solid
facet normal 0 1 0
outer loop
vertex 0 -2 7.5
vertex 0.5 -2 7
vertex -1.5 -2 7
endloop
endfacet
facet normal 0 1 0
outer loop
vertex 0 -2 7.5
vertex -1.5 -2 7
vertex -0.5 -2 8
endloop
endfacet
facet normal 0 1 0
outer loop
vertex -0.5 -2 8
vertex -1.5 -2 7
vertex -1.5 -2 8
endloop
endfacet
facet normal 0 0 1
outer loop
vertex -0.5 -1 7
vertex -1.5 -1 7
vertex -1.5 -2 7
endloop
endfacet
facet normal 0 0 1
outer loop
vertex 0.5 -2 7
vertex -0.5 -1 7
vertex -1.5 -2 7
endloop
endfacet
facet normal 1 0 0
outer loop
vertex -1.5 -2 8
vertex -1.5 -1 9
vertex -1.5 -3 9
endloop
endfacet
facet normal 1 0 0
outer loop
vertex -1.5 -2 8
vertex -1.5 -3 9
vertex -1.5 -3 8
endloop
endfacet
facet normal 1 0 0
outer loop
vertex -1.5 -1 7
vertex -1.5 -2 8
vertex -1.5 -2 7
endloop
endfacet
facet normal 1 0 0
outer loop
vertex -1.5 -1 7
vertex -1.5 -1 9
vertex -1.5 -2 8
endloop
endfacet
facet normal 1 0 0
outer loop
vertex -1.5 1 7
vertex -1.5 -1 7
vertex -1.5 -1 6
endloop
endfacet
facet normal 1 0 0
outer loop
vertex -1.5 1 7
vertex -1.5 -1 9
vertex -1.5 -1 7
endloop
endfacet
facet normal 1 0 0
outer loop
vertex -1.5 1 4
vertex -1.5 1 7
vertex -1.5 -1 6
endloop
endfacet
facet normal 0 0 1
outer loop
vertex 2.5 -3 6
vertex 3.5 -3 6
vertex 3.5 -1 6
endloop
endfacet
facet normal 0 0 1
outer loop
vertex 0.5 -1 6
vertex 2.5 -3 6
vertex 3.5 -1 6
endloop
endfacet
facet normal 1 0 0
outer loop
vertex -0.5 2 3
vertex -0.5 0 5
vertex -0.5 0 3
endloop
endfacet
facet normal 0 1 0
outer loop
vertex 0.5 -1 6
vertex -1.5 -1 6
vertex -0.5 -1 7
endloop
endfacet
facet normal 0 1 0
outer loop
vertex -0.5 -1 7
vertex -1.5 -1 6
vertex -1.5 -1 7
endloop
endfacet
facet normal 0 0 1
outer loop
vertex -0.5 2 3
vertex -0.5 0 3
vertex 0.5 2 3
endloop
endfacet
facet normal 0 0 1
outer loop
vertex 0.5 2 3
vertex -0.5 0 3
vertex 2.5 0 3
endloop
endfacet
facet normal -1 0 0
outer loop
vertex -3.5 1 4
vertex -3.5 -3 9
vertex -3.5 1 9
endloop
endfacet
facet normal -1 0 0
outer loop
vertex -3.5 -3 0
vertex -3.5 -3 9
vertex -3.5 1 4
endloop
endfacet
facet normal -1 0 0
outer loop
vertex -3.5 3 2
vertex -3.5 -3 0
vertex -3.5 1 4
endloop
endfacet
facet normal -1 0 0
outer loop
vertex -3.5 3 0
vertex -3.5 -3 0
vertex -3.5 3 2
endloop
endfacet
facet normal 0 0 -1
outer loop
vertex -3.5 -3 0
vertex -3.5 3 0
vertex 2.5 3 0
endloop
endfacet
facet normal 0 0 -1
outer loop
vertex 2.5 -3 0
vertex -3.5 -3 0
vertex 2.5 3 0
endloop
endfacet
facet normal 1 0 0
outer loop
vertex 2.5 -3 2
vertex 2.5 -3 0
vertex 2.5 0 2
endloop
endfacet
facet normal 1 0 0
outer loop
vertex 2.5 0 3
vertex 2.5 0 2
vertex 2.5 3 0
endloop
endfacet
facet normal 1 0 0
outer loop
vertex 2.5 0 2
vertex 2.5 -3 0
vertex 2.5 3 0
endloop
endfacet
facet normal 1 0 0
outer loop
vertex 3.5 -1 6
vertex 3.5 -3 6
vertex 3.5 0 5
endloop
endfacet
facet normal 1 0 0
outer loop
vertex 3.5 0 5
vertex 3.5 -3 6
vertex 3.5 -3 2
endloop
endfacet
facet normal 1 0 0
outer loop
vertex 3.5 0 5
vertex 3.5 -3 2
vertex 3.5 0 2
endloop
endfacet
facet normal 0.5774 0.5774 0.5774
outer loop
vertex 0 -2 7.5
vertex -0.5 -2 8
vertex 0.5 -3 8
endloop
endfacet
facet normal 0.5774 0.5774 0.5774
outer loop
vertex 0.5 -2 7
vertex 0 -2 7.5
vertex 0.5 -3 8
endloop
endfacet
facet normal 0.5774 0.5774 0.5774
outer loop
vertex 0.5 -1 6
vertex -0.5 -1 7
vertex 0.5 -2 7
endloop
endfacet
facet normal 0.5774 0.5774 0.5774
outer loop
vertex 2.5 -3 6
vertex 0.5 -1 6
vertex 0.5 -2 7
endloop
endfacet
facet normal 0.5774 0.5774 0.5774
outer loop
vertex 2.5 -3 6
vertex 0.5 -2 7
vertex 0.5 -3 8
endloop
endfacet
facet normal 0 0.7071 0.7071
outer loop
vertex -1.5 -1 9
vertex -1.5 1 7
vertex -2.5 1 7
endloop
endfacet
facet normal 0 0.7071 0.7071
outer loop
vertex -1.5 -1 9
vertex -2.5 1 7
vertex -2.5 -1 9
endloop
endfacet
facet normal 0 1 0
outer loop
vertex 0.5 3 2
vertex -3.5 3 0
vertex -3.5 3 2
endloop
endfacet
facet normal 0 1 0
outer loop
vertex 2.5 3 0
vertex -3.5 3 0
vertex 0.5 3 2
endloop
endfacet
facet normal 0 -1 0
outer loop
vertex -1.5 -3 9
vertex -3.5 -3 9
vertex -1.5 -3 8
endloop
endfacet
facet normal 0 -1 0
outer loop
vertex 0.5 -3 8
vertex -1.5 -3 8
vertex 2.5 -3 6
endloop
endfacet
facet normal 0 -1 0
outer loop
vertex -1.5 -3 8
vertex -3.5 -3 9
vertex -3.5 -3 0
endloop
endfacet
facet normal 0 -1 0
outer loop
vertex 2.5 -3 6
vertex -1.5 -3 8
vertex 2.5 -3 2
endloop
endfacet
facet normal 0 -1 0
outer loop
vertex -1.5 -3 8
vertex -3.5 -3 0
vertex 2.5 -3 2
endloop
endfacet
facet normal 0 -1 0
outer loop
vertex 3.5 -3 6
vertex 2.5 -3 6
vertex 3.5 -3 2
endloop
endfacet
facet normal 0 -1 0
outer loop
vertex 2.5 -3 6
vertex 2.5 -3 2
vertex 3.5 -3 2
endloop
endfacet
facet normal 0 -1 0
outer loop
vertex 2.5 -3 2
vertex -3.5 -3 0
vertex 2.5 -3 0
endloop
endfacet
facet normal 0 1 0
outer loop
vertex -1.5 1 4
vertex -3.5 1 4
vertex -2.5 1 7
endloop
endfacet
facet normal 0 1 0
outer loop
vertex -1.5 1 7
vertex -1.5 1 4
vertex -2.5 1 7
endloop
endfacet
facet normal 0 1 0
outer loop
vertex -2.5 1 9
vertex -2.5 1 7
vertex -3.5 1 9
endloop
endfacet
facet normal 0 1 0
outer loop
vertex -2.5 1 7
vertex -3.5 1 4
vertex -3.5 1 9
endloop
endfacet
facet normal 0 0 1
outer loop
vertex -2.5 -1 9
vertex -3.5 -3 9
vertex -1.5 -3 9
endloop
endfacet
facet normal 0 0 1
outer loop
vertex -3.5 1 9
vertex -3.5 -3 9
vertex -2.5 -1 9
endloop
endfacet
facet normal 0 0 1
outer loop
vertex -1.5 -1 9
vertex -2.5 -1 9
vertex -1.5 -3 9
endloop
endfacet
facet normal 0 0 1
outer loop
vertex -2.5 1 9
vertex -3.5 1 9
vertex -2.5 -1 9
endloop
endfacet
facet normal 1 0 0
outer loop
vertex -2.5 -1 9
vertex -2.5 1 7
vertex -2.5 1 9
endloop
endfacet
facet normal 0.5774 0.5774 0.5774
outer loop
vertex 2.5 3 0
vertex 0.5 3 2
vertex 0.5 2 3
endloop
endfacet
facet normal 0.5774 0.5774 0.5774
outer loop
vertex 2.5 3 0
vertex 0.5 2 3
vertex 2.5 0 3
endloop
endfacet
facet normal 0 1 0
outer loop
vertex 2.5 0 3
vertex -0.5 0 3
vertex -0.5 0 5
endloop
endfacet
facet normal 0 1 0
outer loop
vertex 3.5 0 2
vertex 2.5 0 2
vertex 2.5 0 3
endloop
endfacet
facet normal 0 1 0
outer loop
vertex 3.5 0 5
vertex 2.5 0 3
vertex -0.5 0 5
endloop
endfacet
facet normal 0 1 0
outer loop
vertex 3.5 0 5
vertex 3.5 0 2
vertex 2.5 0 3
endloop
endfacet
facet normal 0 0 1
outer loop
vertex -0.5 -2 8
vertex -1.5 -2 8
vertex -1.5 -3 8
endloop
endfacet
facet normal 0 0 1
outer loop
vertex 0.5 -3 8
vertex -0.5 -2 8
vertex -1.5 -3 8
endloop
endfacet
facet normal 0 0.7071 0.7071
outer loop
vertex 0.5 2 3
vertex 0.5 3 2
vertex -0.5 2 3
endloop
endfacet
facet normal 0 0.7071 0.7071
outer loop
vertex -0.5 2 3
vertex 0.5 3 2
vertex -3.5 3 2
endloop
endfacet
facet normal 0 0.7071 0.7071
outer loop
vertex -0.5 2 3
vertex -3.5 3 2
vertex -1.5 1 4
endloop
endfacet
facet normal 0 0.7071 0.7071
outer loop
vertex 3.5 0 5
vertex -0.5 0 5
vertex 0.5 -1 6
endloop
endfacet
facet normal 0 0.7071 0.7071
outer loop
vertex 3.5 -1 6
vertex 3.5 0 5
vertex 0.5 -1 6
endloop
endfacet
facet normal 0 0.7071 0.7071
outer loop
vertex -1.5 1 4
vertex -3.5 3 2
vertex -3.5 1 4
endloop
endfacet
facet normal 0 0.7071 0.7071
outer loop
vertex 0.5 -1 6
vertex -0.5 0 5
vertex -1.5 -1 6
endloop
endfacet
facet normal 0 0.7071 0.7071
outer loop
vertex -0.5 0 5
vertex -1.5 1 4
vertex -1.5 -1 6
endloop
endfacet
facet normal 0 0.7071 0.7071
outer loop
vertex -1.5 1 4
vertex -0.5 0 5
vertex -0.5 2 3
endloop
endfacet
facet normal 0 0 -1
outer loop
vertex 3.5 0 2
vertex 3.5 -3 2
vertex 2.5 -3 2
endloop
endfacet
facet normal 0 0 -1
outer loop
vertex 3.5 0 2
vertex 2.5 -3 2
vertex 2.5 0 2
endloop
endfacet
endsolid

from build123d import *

# Parameters (mm, degrees)
SKETCH1_W           = 7
SKETCH1_H           = 6
BOSS_EXTRUDE1_DEPTH = 9
CUT_EXTRUDE1_DEPTH  = 2
CUT_EXTRUDE2_DEPTH  = 1
CUT_EXTRUDE3_DEPTH  = 6
SKETCH8_W           = 1
SKETCH8_H           = 4
CUT_EXTRUDE6_DEPTH  = 2
CUT_EXTRUDE7_DEPTH  = 1
SKETCH11_W          = 2
SKETCH11_H          = 1
CUT_EXTRUDE9_DEPTH  = 3
CUT_EXTRUDE11_DEPTH = 3
CUT_EXTRUDE12_DEPTH = 1
CUT_EXTRUDE13_DEPTH = 6
CUT_EXTRUDE14_DEPTH = 5
CUT_EXTRUDE16_DEPTH = 5
CUT_EXTRUDE17_DEPTH = 6.773502692
BOSS_EXTRUDE2_DEPTH = 4
CUT_EXTRUDE19_DEPTH = 4
CUT_EXTRUDE20_DEPTH = 3
CUT_EXTRUDE22_DEPTH = 6.773502692
CUT_EXTRUDE23_DEPTH = 10


with BuildPart() as part:
    # Sketch1 → Boss-Extrude1 (new body)
    with BuildSketch(Plane.XY):
        Rectangle(SKETCH1_W, SKETCH1_H)
    extrude(amount=BOSS_EXTRUDE1_DEPTH)

    # Sketch2 → Cut-Extrude1 (cut)
    with BuildSketch(Plane.ZY.offset(3.5)):
        Polygon((2, 3), (4, 1), (9, 1), (9, 3), align=None)
    extrude(amount=-CUT_EXTRUDE1_DEPTH, mode=Mode.SUBTRACT)

    # Sketch3 → Cut-Extrude2 (cut)
    with BuildSketch(Plane(origin=(3.5, 0, 0), x_dir=(0, 0, -1), z_dir=(1, 0, 0))):
        Polygon((0, -3), (-2, -3), (-2, 0), (-3, 0), (0, 3), align=None)
    extrude(amount=-CUT_EXTRUDE2_DEPTH, mode=Mode.SUBTRACT)

    # Sketch5 → Cut-Extrude3 (cut, through all)
    with BuildSketch(Plane.ZY.offset(1.5)):
        Polygon((2, 3), (4, 1), (9, 1), (9, 3), align=None)
    extrude(amount=-CUT_EXTRUDE3_DEPTH, mode=Mode.SUBTRACT)

    # Sketch8 → Cut-Extrude6 (cut)
    with BuildSketch(Plane(origin=(0, 3, 0), x_dir=(1, 0, 0), z_dir=(0, 1, 0))):
        with Locations((3, -2)):
            Rectangle(SKETCH8_W, SKETCH8_H)
    extrude(amount=-CUT_EXTRUDE6_DEPTH, mode=Mode.SUBTRACT)

    # Sketch9 → Cut-Extrude7 (cut)
    with BuildSketch(Plane(origin=(3.5, 0, 0), x_dir=(0, 0, -1), z_dir=(1, 0, 0))):
        Polygon((-2, 1), (-3, 0), (-5, 0), (-5, 1), align=None)
    extrude(amount=-CUT_EXTRUDE7_DEPTH, mode=Mode.SUBTRACT)

    # Sketch11 → Cut-Extrude9 (cut)
    with BuildSketch(Plane(origin=(3.5, 0, 0), x_dir=(0, 0, -1), z_dir=(1, 0, 0))):
        with Locations((-5, 0.5)):
            Rectangle(SKETCH11_W, SKETCH11_H)
    extrude(amount=-CUT_EXTRUDE9_DEPTH, mode=Mode.SUBTRACT)

    # Sketch13 → Cut-Extrude11 (cut)
    with BuildSketch(Plane(origin=(2.5, 0, 0), x_dir=(0, 0, -1), z_dir=(1, 0, 0))):
        Polygon((-5, 0), (-3, 0), (-3, 2), align=None)
    extrude(amount=-CUT_EXTRUDE11_DEPTH, mode=Mode.SUBTRACT)

    # Sketch14 → Cut-Extrude12 (cut)
    with BuildSketch(Plane(origin=(0.5, 0, 0), x_dir=(0, 0, -1), z_dir=(1, 0, 0))):
        Polygon((-4, 1), (-5, 0), (-6, 0), (-6, 1), align=None)
    extrude(amount=-CUT_EXTRUDE12_DEPTH, mode=Mode.SUBTRACT)

    # Sketch15 → Cut-Extrude13 (cut)
    with BuildSketch(Plane(origin=(3.5, 0, 0), x_dir=(0, 0, -1), z_dir=(1, 0, 0))):
        Polygon((-7, 1), (-9, -1), (-9, 1), align=None)
    extrude(amount=-CUT_EXTRUDE13_DEPTH, mode=Mode.SUBTRACT)

    # Sketch17 → Cut-Extrude14 (cut)
    with BuildSketch(Plane(origin=(3.5, 0, 0), x_dir=(0, 0, -1), z_dir=(1, 0, 0))):
        Polygon((-5, 0), (-6, 0), (-6, 1), (-7, 1), (-9, -1), (-9, -3), (-6, -3), (-6, -1), align=None)
    extrude(amount=-CUT_EXTRUDE14_DEPTH, mode=Mode.SUBTRACT)

    # Sketch18 → Cut-Extrude16 (cut)
    with BuildSketch(Plane(origin=(3.5, 0, 0), x_dir=(0, 0, -1), z_dir=(1, 0, 0))):
        Polygon((-3, 2), (-5, 0), (-6, 0), (-6, 1), align=None)
    extrude(amount=-CUT_EXTRUDE16_DEPTH, mode=Mode.SUBTRACT)

    # Sketch20 → Cut-Extrude17 (cut, through all)
    with BuildSketch(Plane(origin=(1.833333333, 1.833333333, 1.833333333), x_dir=(0.816496581, -0.40824829, -0.40824829), z_dir=(0.577350269, 0.577350269, 0.577350269))):
        Polygon((-1.632993162, 0.707106781), (-1.632993162, -0.707106781), (0.816496581, -2.121320344), (0.816496581, 2.121320344), align=None)
    extrude(amount=CUT_EXTRUDE17_DEPTH, mode=Mode.SUBTRACT)

    # Sketch21 → Boss-Extrude2 (add)
    with BuildSketch(Plane(origin=(-1.5, 0, 0), x_dir=(0, 0, -1), z_dir=(1, 0, 0))):
        Polygon((-6, -1), (-7, -1), (-7, -2), (-8, -2), (-8, -3), (-6, -3), align=None)
    extrude(amount=BOSS_EXTRUDE2_DEPTH)

    # Sketch24 → Cut-Extrude19 (cut)
    with BuildSketch(Plane(origin=(1.833333333, 1.833333333, 1.833333333), x_dir=(0.816496581, -0.40824829, -0.40824829), z_dir=(0.577350269, 0.577350269, 0.577350269))):
        Polygon((0.816496581, -6.363961031), (-1.632993162, -4.949747468), (-2.857738033, -5.656854249), (-1.632993162, -7.778174593), align=None)
    extrude(amount=CUT_EXTRUDE19_DEPTH, mode=Mode.SUBTRACT)

    # Sketch25 → Cut-Extrude20 (cut, through all)
    with BuildSketch(Plane(origin=(0, -1, 0), x_dir=(1, 0, 0), z_dir=(0, 1, 0))):
        Polygon((2.5, -6), (0.5, -8), (2.5, -8), align=None)
    extrude(amount=-CUT_EXTRUDE20_DEPTH, mode=Mode.SUBTRACT)

    # Sketch26 → Cut-Extrude22 (cut, through all)
    with BuildSketch(Plane(origin=(1.833333333, 1.833333333, 1.833333333), x_dir=(0.816496581, -0.40824829, -0.40824829), z_dir=(0.577350269, 0.577350269, 0.577350269))):
        Polygon((-1.632993162, -6.363961031), (-2.857738033, -7.071067812), (-1.632993162, -7.778174593), align=None)
    extrude(amount=CUT_EXTRUDE22_DEPTH, mode=Mode.SUBTRACT)

    # Sketch28 → Cut-Extrude23 (cut)
    with BuildSketch(Plane.XY.offset(6)):
        Polygon((0.5, -1), (2.5, -1), (2.5, -3), align=None)
    extrude(amount=CUT_EXTRUDE23_DEPTH, mode=Mode.SUBTRACT)


solid = part.part
